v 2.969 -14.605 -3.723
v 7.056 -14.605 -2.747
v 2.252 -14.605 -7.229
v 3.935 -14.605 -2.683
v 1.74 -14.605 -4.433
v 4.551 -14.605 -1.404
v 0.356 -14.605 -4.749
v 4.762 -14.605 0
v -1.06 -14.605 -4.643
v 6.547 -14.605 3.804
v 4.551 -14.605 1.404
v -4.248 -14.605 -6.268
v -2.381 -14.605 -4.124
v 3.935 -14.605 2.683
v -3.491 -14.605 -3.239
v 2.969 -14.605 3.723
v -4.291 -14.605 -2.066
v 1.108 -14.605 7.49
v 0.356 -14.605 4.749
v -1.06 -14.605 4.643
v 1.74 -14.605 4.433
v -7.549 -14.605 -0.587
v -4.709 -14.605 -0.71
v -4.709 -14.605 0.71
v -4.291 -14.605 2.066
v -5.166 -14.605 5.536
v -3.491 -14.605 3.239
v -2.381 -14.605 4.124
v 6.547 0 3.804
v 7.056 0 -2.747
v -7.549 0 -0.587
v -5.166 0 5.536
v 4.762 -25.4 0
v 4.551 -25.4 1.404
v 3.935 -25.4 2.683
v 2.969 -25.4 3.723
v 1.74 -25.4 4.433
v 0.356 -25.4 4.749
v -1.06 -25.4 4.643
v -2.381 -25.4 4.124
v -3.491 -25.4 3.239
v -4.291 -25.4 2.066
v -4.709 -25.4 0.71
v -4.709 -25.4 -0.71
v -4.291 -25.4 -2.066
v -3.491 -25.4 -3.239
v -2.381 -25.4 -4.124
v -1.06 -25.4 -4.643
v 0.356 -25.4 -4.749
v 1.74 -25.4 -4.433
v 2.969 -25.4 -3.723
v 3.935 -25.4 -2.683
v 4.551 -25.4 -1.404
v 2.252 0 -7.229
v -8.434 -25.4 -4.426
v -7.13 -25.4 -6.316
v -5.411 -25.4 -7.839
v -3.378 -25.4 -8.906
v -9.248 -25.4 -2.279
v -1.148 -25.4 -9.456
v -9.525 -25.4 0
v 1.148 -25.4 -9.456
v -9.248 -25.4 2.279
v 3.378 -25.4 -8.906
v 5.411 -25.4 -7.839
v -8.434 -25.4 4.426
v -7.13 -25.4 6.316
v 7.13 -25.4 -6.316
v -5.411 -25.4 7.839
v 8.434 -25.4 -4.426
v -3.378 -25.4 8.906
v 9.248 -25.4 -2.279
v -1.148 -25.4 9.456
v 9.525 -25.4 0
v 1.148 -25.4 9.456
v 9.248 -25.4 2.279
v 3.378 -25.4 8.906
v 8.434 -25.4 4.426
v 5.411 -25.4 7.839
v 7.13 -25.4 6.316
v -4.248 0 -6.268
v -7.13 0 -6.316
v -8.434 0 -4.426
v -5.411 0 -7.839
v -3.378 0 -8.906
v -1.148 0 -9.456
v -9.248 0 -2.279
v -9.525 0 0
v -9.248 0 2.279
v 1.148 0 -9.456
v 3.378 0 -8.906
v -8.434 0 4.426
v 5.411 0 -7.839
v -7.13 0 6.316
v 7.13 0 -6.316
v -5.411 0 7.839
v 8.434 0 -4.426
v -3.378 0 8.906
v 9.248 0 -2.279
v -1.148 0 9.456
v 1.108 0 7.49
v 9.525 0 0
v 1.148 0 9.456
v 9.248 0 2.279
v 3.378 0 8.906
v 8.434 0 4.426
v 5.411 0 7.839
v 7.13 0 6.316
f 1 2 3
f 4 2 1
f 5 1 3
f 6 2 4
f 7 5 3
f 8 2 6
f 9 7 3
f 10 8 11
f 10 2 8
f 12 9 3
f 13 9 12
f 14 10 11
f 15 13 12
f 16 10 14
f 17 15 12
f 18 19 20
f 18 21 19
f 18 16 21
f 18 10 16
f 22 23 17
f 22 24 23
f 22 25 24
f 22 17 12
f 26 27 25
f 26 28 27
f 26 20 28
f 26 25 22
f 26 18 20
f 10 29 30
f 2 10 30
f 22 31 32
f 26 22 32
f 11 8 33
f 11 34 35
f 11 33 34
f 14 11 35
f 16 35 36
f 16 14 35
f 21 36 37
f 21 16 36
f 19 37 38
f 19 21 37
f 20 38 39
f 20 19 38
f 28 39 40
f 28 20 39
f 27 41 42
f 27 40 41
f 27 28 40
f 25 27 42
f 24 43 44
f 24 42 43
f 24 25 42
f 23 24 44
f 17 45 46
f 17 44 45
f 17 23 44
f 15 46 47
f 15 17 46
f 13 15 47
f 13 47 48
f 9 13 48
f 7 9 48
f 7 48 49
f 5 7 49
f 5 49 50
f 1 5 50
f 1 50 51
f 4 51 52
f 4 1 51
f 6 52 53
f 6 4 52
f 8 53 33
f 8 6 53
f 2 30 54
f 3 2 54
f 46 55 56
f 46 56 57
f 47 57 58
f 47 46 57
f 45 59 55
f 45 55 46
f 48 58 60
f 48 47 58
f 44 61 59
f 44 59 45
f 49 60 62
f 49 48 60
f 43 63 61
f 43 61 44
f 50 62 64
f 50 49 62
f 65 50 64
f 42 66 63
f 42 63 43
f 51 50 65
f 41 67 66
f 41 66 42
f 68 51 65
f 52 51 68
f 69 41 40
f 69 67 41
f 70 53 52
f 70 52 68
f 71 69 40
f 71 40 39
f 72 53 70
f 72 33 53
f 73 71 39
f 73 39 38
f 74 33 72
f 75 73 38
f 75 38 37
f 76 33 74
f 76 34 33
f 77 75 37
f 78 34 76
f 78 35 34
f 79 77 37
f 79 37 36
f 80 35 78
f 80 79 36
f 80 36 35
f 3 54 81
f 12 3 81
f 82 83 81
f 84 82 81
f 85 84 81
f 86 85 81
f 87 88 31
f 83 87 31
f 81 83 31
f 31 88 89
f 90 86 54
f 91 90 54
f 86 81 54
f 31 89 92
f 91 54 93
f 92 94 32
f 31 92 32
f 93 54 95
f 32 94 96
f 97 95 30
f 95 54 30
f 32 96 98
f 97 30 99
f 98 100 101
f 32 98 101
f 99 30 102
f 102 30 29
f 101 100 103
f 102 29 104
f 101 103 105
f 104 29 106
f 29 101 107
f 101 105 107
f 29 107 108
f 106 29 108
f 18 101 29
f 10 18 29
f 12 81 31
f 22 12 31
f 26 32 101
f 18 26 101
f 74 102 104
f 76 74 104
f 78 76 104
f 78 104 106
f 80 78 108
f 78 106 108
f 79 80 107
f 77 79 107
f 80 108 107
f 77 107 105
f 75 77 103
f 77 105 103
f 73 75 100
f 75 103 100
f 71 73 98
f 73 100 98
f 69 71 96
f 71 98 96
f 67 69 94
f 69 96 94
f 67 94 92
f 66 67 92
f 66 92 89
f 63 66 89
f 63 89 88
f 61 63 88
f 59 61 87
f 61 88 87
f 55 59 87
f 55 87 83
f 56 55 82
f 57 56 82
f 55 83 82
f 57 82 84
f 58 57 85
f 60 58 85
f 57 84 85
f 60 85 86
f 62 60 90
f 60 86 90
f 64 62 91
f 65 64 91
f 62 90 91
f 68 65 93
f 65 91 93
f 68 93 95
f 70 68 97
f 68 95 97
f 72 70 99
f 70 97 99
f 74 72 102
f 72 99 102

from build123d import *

# Parameters (mm, degrees)
F0_R     = 9.525
F1_DEPTH = 25.4
F3_R     = 4.7625
F4_DEPTH = 25.401
F2_W     = 9.525
F2_H     = 9.525
F5_DEPTH = 11.0998
F7_DEPTH = 14.605


with BuildPart() as f1:
    # F0 (on Front) → F1 (new body)
    with BuildSketch(Plane.XZ):
        Circle(F0_R)
    extrude(amount=F1_DEPTH)

    # F3 (on Front) → F4 (cut, through all)
    with BuildSketch(Plane.XZ):
        Circle(F3_R)
    extrude(amount=F4_DEPTH, mode=Mode.SUBTRACT)

    # F2 (on Front) → F5 (cut)
    with BuildSketch(Plane.XZ):
        Rectangle(F2_W, F2_H)
    extrude(amount=F5_DEPTH, mode=Mode.SUBTRACT)

    # F6 (on face) → F7 (cut)
    with BuildSketch(Plane(origin=(0, 0, 0), x_dir=(-1, 0, 0), z_dir=(0, 1, 0))):
        Polygon((4.247856, -6.267943), (7.54897, -0.586891), (5.165556, 5.536102), (-1.107627, 7.490297), (-6.546745, 3.804146), (-7.05603, -2.746605), (-2.251981, -7.229106), align=None)
    extrude(amount=-F7_DEPTH, mode=Mode.SUBTRACT)


solid = f1.part
